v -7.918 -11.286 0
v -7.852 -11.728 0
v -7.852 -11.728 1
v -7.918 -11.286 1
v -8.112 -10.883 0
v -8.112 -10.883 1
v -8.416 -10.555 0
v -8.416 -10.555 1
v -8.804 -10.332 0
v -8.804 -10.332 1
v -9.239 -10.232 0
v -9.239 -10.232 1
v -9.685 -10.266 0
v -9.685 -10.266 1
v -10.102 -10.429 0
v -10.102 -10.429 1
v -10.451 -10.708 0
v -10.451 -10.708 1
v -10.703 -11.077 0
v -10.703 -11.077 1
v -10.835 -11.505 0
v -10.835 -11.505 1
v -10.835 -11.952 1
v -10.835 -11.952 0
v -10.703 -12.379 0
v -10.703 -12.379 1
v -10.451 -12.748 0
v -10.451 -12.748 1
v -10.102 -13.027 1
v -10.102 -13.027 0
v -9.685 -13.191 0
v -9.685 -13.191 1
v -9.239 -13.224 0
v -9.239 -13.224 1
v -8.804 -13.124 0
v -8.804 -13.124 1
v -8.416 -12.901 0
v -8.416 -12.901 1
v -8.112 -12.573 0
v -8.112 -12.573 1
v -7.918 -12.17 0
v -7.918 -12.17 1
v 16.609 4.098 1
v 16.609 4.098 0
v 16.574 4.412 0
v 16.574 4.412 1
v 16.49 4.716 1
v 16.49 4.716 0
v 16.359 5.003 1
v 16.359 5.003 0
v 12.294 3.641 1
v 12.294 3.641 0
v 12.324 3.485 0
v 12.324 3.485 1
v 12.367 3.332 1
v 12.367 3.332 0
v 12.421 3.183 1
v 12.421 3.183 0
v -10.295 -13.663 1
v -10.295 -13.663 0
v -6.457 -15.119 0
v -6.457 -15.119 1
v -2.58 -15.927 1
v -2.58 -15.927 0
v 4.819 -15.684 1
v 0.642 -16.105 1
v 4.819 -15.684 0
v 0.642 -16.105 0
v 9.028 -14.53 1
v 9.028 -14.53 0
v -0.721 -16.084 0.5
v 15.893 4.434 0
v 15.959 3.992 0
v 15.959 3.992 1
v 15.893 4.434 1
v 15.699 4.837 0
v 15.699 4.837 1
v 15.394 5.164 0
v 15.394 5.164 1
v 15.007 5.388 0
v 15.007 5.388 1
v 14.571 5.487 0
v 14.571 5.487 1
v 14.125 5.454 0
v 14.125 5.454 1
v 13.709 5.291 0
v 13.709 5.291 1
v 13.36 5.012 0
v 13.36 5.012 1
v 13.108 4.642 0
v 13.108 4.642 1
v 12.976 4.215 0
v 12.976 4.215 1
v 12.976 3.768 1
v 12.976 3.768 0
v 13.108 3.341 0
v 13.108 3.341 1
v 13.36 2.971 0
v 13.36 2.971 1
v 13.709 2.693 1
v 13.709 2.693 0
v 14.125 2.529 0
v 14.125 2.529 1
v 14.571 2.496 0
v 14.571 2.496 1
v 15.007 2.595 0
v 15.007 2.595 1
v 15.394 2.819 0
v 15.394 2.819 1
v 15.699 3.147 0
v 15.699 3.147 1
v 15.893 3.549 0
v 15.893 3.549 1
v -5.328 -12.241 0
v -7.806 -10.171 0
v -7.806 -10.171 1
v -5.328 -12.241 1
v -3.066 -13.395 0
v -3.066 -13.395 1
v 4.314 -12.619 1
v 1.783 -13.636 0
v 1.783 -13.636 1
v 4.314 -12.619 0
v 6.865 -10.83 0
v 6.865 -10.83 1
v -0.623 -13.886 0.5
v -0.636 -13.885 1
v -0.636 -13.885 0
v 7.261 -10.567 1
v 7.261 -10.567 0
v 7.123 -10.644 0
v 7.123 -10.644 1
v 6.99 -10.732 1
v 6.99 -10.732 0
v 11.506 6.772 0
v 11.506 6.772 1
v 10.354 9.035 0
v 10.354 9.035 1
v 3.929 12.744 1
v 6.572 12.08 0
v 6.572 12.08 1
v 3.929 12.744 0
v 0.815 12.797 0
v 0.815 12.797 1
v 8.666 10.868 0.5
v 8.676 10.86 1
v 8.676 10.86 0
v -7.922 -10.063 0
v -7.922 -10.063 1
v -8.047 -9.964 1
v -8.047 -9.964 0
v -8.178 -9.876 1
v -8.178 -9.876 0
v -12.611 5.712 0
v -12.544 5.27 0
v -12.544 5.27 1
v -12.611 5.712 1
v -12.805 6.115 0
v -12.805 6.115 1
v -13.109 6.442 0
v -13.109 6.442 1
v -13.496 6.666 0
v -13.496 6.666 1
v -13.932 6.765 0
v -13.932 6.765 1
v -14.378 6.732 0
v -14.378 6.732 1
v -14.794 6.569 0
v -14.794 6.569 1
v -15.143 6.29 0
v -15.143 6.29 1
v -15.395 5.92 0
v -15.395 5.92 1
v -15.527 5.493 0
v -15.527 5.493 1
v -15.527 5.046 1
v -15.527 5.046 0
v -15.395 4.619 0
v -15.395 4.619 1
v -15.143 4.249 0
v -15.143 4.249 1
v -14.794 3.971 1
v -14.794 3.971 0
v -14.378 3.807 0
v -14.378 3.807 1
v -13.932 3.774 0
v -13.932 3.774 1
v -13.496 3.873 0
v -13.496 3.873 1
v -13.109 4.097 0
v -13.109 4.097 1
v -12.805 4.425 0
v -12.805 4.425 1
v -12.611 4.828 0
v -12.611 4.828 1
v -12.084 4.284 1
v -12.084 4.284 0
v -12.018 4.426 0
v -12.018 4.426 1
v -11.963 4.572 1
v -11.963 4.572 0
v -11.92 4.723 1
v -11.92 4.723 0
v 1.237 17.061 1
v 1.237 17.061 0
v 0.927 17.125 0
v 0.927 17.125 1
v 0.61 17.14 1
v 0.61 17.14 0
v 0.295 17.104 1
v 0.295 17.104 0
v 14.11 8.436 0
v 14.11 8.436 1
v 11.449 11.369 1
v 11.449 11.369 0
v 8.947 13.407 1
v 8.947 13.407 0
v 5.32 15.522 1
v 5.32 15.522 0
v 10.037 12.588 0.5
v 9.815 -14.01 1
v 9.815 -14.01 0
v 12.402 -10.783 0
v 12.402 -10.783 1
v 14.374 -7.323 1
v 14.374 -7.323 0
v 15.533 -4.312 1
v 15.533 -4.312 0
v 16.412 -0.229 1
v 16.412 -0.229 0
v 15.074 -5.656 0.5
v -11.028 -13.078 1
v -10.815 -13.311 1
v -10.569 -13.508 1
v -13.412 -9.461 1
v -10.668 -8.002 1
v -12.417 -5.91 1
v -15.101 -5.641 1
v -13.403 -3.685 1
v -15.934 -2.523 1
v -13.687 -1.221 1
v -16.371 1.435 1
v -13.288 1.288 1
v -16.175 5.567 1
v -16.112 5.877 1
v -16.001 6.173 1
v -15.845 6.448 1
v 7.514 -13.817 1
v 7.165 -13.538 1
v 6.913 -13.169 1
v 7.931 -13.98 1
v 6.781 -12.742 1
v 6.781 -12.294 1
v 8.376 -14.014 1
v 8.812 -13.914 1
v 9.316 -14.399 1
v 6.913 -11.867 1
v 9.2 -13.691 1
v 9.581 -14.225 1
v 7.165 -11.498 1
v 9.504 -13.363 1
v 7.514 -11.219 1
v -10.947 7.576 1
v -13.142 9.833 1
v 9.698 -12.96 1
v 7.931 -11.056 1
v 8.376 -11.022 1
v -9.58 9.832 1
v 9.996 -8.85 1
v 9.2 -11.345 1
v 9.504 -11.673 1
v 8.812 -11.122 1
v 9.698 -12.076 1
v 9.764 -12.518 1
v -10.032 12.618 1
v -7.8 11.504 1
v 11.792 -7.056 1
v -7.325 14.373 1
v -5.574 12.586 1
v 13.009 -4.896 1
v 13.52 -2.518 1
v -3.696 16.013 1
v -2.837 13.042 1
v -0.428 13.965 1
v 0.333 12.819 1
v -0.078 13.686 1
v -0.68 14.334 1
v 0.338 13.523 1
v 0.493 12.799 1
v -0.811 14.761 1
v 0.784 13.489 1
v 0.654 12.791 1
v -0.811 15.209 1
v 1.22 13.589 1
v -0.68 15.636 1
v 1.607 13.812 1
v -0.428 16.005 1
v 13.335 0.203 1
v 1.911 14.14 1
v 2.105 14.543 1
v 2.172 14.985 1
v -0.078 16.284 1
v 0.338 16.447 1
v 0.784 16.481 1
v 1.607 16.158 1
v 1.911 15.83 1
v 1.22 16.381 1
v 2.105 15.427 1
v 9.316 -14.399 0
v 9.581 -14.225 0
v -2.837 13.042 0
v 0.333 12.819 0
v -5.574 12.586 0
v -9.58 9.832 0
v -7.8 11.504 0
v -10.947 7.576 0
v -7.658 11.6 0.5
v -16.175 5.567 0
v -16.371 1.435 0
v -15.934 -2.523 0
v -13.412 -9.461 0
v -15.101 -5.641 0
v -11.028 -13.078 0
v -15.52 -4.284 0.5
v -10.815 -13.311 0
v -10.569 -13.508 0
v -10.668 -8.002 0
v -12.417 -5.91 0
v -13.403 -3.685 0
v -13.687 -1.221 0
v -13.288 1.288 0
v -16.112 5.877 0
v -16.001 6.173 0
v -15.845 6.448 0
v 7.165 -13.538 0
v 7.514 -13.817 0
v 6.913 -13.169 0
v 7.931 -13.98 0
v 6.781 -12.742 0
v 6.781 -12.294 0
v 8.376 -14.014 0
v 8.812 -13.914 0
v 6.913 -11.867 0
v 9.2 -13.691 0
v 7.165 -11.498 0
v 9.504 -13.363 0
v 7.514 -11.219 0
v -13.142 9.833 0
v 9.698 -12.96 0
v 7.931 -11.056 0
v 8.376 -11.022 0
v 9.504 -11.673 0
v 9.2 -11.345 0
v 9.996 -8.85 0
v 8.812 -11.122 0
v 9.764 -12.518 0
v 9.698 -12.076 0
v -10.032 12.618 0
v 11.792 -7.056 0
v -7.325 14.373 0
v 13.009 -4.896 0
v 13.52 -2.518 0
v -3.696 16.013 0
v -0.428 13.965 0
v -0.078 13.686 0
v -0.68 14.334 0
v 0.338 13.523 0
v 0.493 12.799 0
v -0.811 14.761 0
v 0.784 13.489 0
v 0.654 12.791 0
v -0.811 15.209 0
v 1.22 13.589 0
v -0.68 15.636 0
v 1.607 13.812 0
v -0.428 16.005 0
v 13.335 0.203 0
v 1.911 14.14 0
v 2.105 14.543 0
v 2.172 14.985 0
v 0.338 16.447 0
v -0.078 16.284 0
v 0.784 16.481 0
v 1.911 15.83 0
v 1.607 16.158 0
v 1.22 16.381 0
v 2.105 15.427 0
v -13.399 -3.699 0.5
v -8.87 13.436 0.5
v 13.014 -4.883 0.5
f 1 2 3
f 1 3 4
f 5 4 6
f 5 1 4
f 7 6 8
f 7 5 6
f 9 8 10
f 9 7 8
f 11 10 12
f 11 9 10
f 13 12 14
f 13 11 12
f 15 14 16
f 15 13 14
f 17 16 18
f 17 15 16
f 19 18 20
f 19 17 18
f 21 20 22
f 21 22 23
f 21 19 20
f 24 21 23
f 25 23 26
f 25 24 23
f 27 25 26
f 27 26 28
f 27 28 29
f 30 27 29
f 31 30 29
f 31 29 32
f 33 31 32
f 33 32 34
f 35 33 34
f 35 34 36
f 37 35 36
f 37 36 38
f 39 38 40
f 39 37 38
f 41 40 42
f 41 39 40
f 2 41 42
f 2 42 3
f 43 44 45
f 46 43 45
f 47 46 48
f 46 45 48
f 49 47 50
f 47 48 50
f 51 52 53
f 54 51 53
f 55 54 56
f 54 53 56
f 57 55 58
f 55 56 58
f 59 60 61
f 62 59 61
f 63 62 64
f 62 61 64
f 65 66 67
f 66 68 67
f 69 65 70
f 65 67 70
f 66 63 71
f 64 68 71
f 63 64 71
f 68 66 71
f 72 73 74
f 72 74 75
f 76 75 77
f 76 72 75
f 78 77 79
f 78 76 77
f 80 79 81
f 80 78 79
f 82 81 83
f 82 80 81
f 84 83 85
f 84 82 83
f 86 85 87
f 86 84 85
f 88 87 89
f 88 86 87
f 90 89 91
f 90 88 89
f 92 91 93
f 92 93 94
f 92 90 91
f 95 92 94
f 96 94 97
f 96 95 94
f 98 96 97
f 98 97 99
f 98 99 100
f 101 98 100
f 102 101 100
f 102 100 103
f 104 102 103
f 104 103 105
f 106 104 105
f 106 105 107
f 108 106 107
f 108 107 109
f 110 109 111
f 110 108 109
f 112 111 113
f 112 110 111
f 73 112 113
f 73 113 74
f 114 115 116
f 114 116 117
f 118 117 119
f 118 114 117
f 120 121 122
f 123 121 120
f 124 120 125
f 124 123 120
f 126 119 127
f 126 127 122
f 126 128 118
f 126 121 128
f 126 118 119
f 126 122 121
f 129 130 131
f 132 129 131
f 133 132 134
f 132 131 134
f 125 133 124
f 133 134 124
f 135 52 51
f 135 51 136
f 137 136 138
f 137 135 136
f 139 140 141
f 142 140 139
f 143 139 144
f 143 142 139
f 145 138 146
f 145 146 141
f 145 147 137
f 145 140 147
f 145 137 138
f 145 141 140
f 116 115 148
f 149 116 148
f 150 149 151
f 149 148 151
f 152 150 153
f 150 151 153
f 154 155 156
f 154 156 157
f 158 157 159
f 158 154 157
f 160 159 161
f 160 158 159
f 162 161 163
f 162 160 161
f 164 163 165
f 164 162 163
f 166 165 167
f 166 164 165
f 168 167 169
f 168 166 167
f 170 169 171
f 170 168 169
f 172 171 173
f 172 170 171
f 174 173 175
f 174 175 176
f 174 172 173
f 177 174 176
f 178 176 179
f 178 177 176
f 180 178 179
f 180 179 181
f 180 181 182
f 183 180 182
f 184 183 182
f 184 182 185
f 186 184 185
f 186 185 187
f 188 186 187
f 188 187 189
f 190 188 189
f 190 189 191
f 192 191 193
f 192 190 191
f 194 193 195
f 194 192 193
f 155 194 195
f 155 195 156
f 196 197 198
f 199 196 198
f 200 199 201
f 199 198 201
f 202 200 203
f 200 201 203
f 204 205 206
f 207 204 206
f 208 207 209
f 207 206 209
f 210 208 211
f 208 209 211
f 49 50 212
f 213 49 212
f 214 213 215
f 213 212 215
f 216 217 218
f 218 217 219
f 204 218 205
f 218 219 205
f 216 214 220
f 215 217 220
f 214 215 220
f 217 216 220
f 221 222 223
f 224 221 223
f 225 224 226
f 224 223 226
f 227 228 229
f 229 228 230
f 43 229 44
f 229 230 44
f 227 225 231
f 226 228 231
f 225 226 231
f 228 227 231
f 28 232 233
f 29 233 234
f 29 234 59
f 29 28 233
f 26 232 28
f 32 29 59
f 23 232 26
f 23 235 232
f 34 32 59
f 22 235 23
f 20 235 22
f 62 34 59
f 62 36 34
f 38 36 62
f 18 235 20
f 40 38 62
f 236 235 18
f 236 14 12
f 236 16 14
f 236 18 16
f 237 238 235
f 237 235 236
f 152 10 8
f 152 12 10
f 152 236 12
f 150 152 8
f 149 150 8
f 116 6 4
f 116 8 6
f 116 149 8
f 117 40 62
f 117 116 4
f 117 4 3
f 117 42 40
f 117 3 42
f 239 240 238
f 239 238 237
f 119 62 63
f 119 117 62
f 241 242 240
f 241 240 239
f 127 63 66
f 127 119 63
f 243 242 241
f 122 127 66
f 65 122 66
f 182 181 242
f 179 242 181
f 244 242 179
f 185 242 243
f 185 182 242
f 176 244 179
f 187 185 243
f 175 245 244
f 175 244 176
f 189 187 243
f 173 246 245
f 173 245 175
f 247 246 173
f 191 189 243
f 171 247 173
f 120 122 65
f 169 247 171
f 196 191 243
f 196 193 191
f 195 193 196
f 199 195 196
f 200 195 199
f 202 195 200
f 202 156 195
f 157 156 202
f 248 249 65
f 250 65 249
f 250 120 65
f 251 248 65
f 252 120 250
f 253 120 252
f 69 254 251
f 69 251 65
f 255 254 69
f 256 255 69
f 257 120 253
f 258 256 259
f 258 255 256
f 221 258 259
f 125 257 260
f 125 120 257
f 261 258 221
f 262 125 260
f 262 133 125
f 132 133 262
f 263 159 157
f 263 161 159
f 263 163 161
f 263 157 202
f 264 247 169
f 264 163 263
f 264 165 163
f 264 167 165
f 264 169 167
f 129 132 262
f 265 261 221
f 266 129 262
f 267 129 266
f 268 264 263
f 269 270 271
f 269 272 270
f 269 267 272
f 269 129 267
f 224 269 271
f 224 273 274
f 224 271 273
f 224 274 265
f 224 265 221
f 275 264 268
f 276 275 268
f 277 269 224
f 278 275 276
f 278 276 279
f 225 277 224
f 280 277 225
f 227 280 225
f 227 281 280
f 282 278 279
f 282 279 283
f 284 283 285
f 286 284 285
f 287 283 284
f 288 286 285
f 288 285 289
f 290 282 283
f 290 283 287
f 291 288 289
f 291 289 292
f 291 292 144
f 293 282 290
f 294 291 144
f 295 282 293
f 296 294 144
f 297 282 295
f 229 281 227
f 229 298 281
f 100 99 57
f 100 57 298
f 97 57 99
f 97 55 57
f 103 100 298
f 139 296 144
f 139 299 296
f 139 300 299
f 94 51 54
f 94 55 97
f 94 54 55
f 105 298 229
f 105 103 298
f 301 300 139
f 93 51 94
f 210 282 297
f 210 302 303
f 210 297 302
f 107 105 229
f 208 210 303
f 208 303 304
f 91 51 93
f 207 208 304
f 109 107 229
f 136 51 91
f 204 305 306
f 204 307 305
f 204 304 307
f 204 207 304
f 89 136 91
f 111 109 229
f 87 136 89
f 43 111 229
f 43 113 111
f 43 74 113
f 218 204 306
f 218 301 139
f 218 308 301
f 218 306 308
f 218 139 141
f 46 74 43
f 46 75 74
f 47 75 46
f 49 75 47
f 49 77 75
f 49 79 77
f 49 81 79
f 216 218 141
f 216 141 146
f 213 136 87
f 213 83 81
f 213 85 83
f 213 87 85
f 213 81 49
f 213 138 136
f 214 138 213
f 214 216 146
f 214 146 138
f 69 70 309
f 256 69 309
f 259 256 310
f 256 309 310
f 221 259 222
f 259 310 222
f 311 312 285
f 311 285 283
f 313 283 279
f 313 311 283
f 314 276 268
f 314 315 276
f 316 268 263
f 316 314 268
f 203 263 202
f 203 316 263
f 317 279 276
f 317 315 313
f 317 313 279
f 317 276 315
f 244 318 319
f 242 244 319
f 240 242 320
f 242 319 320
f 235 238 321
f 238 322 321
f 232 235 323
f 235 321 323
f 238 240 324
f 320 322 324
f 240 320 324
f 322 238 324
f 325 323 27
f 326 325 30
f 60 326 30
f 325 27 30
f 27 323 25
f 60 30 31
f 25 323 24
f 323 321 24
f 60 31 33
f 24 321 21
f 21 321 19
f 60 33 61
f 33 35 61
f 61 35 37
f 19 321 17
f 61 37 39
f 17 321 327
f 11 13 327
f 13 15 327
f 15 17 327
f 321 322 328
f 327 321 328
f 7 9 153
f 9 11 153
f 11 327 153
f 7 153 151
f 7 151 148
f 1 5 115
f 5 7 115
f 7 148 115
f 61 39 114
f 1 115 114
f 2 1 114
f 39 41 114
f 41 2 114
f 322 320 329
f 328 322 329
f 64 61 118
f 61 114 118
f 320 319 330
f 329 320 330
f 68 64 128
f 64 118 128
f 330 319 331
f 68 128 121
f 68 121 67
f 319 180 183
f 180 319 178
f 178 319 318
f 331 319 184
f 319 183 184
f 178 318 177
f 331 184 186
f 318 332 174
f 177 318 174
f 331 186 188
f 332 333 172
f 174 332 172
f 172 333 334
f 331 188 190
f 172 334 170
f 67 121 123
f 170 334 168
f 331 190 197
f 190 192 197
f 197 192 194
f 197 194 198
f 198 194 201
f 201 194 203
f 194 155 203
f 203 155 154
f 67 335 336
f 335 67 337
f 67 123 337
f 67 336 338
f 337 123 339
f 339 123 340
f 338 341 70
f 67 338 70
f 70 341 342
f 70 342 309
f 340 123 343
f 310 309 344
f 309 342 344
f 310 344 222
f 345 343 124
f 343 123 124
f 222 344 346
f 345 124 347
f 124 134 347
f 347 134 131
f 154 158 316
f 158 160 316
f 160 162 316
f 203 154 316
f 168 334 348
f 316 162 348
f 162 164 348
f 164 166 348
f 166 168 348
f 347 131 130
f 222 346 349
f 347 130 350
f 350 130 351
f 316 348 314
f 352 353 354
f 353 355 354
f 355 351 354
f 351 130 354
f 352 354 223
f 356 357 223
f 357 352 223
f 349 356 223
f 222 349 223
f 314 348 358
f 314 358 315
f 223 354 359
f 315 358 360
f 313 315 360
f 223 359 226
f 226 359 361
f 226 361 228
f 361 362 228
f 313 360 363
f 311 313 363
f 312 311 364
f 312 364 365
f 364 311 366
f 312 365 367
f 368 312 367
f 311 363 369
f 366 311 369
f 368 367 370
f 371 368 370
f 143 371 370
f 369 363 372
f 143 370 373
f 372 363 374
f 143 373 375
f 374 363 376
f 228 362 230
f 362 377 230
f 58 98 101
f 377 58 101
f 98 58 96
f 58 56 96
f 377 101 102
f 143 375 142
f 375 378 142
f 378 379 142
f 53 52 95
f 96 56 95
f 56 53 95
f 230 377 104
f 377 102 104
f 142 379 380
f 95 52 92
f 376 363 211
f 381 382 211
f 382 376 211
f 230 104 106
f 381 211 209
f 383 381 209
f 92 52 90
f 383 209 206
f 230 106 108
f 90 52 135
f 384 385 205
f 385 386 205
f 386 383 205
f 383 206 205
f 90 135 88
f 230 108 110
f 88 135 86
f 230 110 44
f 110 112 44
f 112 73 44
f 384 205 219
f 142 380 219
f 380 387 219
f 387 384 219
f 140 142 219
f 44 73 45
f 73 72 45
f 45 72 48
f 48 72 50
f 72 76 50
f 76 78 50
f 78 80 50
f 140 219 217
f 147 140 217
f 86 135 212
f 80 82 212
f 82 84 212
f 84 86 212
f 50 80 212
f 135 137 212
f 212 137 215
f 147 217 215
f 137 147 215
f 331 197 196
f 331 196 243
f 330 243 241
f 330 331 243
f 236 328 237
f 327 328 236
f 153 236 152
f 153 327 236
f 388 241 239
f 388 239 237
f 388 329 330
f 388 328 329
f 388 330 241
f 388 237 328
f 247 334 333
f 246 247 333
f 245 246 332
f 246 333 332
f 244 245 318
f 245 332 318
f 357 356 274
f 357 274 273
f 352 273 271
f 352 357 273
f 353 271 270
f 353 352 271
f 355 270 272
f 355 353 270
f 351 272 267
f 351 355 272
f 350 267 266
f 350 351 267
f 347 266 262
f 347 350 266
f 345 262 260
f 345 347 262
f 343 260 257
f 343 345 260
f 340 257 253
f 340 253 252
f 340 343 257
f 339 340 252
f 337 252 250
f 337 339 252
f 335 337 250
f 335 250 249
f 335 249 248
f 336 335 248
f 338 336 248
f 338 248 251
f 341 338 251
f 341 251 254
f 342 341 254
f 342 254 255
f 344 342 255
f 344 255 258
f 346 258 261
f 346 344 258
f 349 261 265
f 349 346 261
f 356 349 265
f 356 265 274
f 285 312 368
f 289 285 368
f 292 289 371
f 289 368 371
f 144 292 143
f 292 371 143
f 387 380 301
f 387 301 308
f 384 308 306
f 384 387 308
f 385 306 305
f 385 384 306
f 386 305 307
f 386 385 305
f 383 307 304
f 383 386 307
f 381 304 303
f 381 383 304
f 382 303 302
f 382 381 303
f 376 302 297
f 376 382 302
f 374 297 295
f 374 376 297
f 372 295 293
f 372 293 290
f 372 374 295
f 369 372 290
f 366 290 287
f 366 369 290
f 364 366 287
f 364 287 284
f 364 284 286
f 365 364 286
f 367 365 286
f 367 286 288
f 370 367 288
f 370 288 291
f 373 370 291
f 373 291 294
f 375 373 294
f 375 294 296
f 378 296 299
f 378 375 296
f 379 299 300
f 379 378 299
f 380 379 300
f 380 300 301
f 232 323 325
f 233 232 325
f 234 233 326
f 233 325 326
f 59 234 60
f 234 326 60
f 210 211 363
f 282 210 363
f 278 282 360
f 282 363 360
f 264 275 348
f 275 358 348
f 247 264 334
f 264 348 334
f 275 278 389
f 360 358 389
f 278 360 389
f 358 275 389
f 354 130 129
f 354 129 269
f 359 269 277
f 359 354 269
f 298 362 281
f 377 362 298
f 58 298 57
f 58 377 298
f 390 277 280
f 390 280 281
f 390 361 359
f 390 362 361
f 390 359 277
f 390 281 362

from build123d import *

# Parameters (mm, degrees)
SKETCH_1_R      = 1.5
EXTRUDE_1_DEPTH = 1


with BuildPart() as part:
    # 草图1 → 凸台-拉伸1 (new body)
    with BuildSketch(Plane.XY):
        with BuildLine():
            ThreePointArc((9.027564348, -14.530044737), (9.452188044, -14.317284831), (9.814671703, -14.010401047))
            add(Edge.make_bspline(
                [(9.814671703, -14.010401047), (12.18822328, -11.458756692), (15.692863494, -5.893557839), (16.722450019, 0.624994049), (16.609112546, 4.098471157)],
                knots=[0.022064742, 0.022064742, 0.022064742, 0.022064742, 0.499959338, 0.977990906, 0.977990906, 0.977990906, 0.977990906], degree=3))
            ThreePointArc((16.609112546, 4.098471157), (16.53806505, 4.565454975), (16.359479137, 5.002752018))
            add(Edge.make_bspline(
                [(16.359479137, 5.002752018), (14.674806415, 8.042450428), (10.446892996, 13.109630634), (4.583537519, 16.088725104), (1.237093036, 17.061322309)],
                knots=[0.022009094, 0.022009094, 0.022009094, 0.022009094, 0.500040662, 0.977935258, 0.977935258, 0.977935258, 0.977935258], degree=3))
            ThreePointArc((1.237093036, 17.061322309), (0.768508115, 17.138783476), (0.294870912, 17.103571828))
            add(Edge.make_bspline(
                [(0.294870912, 17.103571828), (-3.125200659, 16.434385016), (-9.231172481, 13.992221488), (-13.895447236, 9.324238792), (-15.845236863, 6.448095314)],
                knots=[0.022064742, 0.022064742, 0.022064742, 0.022064742, 0.499960608, 0.977922402, 0.977922402, 0.977922402, 0.977922402], degree=3))
            ThreePointArc((-15.845236863, 6.448095314), (-16.062723303, 6.027327569), (-16.175163145, 5.567215485))
            add(Edge.make_bspline(
                [(-16.175163145, 5.567215485), (-16.595831692, 2.107197873), (-16.160161694, -4.45559692), (-13.161387867, -10.33481003), (-11.028034261, -13.078319909)],
                knots=[0.021996491, 0.021996491, 0.021996491, 0.021996491, 0.499960843, 0.977990945, 0.977990945, 0.977990945, 0.977990945], degree=3))
            ThreePointArc((-11.028034261, -13.078319909), (-10.696067568, -13.414360903), (-10.294548569, -13.663173939))
            add(Edge.make_bspline(
                [(-10.294548569, -13.663173939), (-7.144931204, -15.132114571), (-0.746064836, -16.746443383), (5.74855557, -15.710187793), (9.027564348, -14.530044737)],
                knots=[0.022009307, 0.022009307, 0.022009307, 0.022009307, 0.500040658, 0.977935258, 0.977935258, 0.977935258, 0.977935258], degree=3))
        make_face()
        with Locations((8.264326198, -12.518023506)):
            Circle(SKETCH_1_R, mode=Mode.SUBTRACT)
        with Locations((-9.351530584, -11.728123283)):
            Circle(SKETCH_1_R, mode=Mode.SUBTRACT)
        with Locations((-14.043889946, 5.269644693)):
            Circle(SKETCH_1_R, mode=Mode.SUBTRACT)
        with Locations((0.671929263, 14.984942812)):
            Circle(SKETCH_1_R, mode=Mode.SUBTRACT)
        with Locations((14.459165069, 3.991559284)):
            Circle(SKETCH_1_R, mode=Mode.SUBTRACT)
        with BuildLine():
            ThreePointArc((-12.084118167, 4.284259186), (-11.989009709, 4.498598439), (-11.919642267, 4.722596412))
            add(Edge.make_bspline(
                [(0.333250802, 12.818762133), (-2.935666702, 13.36550918), (-8.291080057, 12.535805727), (-11.122073794, 7.958530689), (-11.919642267, 4.722596412)],
                knots=[0.011876539, 0.011876539, 0.011876539, 0.011876539, 0.500003959, 0.988536873, 0.988536873, 0.988536873, 0.988536873], degree=3))
            ThreePointArc((0.333250802, 12.818762133), (0.573655745, 12.793365714), (0.815368633, 12.797159765))
            add(Edge.make_bspline(
                [(12.293898461, 3.640629682), (11.788818781, 6.932897703), (9.378560044, 11.743845098), (4.119958064, 13.049350775), (0.815368633, 12.797159765)],
                knots=[0.011651073, 0.011651073, 0.011651073, 0.011651073, 0.499978932, 0.988122793, 0.988122793, 0.988122793, 0.988122793], degree=3))
            ThreePointArc((12.293898461, 3.640629682), (12.343962742, 3.407799774), (12.421347321, 3.182571388))
            add(Edge.make_bspline(
                [(7.261467235, -10.567176253), (10.236427241, -9.069498048), (14.068062226, -5.28940284), (13.683697639, 0.116101841), (12.421347321, 3.182571388)],
                knots=[0.011651023, 0.011651023, 0.011651023, 0.011651023, 0.499963297, 0.988308236, 0.988308236, 0.988308236, 0.988308236], degree=3))
            ThreePointArc((7.261467235, -10.567176253), (7.05550434, -10.686738072), (6.865213221, -10.829933857))
            add(Edge.make_bspline(
                [(-7.806108488, -10.171458919), (-5.462403522, -12.538035871), (-0.683269899, -15.014043888), (4.338910959, -12.978090664), (6.865213221, -10.829933857)],
                knots=[0.011648007, 0.011648007, 0.011648007, 0.011648007, 0.499963567, 0.988308296, 0.988308296, 0.988308296, 0.988308296], degree=3))
            ThreePointArc((-7.806108488, -10.171458919), (-7.983418072, -10.012559189), (-8.178354084, -9.875855991))
            add(Edge.make_bspline(
                [(-12.084118167, 4.284259186), (-13.612076453, 1.322501907), (-14.491074702, -3.988767844), (-11.002068971, -8.136759896), (-8.178354084, -9.875855991)],
                knots=[0.011463127, 0.011463127, 0.011463127, 0.011463127, 0.499980132, 0.988311969, 0.988311969, 0.988311969, 0.988311969], degree=3))
        make_face(mode=Mode.SUBTRACT)
    extrude(amount=EXTRUDE_1_DEPTH)


solid = part.part
